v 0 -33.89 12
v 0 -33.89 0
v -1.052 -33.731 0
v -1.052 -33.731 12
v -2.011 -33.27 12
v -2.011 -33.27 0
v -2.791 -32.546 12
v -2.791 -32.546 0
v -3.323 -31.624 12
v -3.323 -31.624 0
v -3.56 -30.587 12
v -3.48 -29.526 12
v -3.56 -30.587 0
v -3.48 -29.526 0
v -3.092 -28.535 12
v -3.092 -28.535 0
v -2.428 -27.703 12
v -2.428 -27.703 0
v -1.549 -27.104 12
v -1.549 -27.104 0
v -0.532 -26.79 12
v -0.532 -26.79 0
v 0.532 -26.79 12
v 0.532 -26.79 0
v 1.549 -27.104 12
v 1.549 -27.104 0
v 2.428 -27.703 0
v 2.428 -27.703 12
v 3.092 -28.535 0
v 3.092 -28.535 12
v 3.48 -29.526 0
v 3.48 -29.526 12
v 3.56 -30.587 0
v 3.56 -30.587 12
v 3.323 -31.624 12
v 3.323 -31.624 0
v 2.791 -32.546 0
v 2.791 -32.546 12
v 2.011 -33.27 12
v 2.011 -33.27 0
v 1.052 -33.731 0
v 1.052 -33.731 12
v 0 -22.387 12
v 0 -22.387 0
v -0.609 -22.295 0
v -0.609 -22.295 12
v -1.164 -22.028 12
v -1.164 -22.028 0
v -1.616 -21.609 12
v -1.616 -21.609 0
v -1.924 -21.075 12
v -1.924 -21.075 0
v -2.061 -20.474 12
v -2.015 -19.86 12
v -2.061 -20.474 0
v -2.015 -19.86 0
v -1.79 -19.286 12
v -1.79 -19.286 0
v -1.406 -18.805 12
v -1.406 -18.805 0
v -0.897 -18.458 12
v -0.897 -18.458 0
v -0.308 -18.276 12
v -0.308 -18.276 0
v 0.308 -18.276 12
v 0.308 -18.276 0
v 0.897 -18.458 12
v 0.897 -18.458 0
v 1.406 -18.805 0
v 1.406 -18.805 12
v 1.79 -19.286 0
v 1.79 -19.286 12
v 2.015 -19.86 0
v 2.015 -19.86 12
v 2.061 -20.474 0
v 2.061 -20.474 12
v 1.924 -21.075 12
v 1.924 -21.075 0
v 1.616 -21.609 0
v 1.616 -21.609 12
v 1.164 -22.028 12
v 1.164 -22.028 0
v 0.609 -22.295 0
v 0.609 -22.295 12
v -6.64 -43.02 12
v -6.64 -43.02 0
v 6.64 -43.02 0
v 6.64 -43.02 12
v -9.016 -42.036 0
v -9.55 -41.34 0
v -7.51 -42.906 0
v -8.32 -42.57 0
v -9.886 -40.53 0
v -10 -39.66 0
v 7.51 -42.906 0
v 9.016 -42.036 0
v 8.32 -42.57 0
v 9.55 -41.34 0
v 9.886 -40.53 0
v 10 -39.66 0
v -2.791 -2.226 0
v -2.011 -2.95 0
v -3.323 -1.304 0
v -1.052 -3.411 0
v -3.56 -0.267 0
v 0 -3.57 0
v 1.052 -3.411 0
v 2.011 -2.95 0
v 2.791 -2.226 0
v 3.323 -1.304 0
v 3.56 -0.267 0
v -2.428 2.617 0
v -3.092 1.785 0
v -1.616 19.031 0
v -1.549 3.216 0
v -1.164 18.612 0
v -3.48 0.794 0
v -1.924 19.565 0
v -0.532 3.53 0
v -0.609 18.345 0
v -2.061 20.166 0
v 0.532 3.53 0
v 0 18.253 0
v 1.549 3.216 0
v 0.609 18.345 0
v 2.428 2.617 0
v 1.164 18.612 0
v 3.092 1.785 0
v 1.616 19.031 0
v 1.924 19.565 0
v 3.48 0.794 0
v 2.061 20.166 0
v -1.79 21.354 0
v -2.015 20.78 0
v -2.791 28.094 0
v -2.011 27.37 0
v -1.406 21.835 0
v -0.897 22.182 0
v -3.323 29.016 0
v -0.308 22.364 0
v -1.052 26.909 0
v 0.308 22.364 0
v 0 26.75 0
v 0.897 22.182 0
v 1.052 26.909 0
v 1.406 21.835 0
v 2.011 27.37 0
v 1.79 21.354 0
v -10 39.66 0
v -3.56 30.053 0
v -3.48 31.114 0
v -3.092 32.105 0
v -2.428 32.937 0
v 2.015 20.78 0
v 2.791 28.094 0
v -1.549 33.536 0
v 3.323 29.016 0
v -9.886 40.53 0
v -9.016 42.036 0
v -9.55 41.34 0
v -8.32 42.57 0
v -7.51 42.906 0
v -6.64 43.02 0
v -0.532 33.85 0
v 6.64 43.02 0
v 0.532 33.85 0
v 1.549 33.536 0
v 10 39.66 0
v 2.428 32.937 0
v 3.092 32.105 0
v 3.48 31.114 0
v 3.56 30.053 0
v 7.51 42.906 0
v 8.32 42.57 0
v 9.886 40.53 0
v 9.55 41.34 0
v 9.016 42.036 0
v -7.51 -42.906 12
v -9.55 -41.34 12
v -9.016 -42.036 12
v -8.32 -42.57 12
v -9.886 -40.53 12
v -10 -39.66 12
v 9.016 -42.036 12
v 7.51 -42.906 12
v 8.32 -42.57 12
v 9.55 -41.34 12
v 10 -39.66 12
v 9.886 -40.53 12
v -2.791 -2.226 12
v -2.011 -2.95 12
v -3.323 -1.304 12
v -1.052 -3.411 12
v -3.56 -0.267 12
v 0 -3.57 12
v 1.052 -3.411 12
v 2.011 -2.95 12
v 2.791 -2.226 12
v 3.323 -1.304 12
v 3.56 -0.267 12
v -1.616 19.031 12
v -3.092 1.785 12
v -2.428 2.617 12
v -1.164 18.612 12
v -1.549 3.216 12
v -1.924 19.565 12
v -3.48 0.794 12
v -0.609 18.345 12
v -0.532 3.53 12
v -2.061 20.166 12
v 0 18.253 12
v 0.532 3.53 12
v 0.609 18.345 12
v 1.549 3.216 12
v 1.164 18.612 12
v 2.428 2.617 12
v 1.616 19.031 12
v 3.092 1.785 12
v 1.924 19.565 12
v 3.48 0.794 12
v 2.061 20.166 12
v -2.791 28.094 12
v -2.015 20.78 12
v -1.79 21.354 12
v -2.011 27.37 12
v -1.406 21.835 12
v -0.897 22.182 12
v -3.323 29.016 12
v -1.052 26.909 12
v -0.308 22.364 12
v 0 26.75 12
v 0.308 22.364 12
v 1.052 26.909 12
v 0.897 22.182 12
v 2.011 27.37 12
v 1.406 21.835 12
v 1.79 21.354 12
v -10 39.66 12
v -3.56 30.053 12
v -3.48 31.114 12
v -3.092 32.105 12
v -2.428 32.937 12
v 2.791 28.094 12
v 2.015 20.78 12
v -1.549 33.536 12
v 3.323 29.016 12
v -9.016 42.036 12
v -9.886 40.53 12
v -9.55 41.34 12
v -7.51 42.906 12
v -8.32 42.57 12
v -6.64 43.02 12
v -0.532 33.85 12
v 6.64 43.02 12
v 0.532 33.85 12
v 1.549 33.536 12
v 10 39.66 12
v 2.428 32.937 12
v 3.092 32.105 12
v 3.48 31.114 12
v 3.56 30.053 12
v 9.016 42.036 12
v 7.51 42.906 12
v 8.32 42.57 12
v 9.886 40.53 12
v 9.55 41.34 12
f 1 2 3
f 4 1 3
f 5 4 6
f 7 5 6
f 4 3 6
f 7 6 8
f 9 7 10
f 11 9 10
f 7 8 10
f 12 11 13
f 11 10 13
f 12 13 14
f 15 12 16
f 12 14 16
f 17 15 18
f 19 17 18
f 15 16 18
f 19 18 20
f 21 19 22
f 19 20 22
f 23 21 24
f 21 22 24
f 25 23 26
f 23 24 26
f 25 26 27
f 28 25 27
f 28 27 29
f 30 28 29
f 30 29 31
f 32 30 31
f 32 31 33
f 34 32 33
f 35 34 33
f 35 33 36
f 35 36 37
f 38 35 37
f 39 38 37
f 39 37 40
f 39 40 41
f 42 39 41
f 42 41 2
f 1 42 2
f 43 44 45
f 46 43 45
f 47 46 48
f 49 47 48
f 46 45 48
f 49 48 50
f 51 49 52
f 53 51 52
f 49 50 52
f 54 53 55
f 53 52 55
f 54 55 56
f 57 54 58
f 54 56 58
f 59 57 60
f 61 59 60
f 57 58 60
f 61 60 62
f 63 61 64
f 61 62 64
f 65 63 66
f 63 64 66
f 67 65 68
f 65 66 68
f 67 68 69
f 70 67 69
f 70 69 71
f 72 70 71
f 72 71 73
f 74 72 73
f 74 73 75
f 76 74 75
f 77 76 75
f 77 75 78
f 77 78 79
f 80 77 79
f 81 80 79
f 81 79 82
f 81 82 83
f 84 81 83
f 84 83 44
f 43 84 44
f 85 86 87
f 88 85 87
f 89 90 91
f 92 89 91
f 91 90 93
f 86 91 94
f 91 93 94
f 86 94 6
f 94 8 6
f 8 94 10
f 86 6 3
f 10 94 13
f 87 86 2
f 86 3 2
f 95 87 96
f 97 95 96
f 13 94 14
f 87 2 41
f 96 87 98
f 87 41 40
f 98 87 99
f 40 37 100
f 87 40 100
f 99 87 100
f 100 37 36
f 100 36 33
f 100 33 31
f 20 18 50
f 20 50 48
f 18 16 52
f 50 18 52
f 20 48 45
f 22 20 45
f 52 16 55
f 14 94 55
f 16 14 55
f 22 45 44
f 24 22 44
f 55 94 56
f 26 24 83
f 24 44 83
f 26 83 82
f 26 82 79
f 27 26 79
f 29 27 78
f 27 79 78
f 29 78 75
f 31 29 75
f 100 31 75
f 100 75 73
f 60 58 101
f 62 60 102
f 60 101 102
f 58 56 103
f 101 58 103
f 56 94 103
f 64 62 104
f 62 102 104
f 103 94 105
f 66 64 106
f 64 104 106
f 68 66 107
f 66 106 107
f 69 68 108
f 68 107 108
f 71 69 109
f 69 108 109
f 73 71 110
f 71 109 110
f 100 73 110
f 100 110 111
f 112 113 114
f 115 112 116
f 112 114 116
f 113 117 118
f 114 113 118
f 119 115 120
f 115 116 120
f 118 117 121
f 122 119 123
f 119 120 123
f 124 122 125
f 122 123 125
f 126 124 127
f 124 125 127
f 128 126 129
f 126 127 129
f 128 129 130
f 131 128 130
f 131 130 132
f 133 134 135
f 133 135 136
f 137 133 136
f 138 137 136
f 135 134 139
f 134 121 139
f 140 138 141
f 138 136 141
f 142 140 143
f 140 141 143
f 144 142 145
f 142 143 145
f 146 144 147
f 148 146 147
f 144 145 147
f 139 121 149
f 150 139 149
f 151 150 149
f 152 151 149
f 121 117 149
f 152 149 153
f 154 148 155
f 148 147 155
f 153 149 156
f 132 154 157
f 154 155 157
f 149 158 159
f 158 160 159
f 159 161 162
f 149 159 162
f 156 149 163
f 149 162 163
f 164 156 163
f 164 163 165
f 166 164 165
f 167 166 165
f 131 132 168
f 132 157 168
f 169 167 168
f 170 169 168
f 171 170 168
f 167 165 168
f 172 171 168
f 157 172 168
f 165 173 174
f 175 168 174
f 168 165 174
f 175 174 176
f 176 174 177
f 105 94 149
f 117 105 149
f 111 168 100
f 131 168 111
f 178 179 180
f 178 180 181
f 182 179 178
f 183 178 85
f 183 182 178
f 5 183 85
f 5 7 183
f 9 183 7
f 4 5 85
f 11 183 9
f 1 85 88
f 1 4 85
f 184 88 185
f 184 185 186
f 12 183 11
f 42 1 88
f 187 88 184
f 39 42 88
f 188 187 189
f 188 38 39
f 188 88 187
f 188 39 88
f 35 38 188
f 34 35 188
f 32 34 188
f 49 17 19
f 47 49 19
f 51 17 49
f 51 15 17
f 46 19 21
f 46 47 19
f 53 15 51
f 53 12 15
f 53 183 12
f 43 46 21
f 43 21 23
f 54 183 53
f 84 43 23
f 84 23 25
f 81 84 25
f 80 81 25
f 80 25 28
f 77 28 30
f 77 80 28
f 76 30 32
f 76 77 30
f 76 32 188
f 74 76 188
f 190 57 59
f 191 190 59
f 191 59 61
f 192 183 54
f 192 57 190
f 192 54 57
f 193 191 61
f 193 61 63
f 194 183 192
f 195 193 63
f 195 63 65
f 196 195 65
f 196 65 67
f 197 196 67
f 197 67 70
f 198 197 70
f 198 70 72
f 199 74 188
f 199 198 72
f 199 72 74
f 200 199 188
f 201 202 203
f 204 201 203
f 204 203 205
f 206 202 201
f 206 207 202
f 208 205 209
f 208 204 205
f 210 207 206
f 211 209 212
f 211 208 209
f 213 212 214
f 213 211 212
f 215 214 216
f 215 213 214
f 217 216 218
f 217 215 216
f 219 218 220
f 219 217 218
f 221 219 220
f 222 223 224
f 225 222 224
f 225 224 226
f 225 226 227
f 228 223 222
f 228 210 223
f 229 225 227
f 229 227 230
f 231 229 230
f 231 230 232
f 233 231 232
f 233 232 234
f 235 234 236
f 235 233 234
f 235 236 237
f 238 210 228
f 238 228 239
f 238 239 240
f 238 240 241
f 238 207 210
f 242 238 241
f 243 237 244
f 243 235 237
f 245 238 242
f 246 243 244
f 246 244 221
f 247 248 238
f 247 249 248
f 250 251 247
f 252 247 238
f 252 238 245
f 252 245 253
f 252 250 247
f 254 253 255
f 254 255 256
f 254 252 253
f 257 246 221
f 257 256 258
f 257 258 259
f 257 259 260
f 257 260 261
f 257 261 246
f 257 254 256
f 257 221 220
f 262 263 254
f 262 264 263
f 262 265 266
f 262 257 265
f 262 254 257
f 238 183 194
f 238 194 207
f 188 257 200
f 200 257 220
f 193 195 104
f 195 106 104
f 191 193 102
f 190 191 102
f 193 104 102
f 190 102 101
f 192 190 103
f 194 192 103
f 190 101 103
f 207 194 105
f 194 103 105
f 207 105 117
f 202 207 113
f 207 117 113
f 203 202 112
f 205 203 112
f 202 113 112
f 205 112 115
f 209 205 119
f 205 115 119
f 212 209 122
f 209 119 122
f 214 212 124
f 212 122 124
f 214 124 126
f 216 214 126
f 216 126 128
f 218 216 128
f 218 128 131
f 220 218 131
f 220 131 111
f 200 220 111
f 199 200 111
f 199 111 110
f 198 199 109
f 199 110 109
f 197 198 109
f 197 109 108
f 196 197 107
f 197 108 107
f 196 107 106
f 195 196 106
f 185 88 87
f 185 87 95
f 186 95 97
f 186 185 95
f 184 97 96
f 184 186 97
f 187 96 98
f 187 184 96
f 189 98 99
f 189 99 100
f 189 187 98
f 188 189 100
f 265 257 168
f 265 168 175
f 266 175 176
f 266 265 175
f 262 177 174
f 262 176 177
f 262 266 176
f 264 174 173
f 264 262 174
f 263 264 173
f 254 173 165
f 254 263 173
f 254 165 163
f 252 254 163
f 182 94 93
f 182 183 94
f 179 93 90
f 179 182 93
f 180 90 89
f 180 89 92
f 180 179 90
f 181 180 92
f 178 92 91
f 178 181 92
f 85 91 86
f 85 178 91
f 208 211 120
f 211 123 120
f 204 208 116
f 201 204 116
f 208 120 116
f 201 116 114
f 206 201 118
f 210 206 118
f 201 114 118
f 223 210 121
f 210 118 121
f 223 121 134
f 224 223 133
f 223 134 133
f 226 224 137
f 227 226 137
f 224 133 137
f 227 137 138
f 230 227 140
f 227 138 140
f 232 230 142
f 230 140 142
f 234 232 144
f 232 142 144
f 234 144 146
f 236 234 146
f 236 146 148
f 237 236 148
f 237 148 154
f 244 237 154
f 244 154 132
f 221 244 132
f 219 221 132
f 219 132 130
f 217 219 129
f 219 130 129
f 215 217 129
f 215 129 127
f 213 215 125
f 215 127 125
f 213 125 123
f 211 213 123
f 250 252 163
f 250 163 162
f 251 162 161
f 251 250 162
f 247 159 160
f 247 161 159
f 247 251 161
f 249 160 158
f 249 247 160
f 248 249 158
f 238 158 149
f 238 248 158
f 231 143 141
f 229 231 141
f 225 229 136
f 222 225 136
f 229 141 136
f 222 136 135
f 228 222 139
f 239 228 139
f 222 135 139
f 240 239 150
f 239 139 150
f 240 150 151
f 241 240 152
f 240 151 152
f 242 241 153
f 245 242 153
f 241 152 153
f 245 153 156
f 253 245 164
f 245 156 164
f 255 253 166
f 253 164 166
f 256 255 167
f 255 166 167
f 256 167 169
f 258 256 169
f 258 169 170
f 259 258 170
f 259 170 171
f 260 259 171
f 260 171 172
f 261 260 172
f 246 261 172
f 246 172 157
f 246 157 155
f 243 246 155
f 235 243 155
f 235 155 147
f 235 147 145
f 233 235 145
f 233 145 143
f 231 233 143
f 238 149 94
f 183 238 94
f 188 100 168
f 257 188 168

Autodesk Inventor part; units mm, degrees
ref_plane "YZ Plane" through (0, 0, 0) normal (1, 0, 0) x (0, 1, 0)
ref_plane "XZ Plane" through (0, 0, 0) normal (0, 1, 0) x (-1, 0, 0)
ref_plane "XY Plane" through (0, 0, 0) normal (0, 0, 1) x (1, 0, 0)
sketch "Sketch1" plane through (0, 0, 0) normal (0, 0, 1) x (1, 0, 0)
  line L0 (-10, -43.02) -> (10, -43.02)
  line L1 (10, -43.02) -> (10, 43.02)
  line L2 (10, 43.02) -> (-10, 43.02)
  line L3 (-10, 43.02) -> (-10, -43.02)
  line L4 (-10, -43.02) -> (10, 43.02) construction
  line L5 (10, -43.02) -> (-10, 43.02) construction
  point P0 (0, 0)
  dimension "d0" = 20
  dimension "d1" = 86.04
extrude "Extrusion1" add sketch "Sketch1" along normal blind 12
sketch "Sketch2" plane through (0, 0, 12) normal (0, 0, 1) x (1, 0, 0)
  point P0 (0, 0)
  point P1 (0, 0)
  point P2 (0, 30.32)
  point P3 (0, -30.32)
  dimension "d4" = 30.32
  dimension "d5" = 30.32
hole "Hole1" at (0, 0, 12) at (0, 30.32, 12) at (0, -30.32, 12) direction (0, 0, -1) diameter 7.14 end through all
sketch "Sketch3" plane through (0, 0, 12) normal (0, 0, 1) x (1, 0, 0)
  circle A0 centre (0, 0) radius 3.57 projected
  point P0 (0, 20.32)
  point P1 (0, -20.32)
  dimension "d13" = 20.32
  dimension "d14" = 20.32
hole "Hole2" at (0, 20.32, 12) at (0, -20.32, 12) direction (0, 0, -1) diameter 4.134 end through all thread size "M5x0.8" class "6H" standard "ANSI Metric M Profile"
fillet "Fillet1" radius 3.36 4 edges at (10, 43.02, 6) (-10, 43.02, 6) (10, -43.02, 6) (-10, -43.02, 6)
equation "\"d5\" = d4"
equation "\"d14\" = d13"
properties part number "VSlot Spacer Block" material "Aluminum 6061"
